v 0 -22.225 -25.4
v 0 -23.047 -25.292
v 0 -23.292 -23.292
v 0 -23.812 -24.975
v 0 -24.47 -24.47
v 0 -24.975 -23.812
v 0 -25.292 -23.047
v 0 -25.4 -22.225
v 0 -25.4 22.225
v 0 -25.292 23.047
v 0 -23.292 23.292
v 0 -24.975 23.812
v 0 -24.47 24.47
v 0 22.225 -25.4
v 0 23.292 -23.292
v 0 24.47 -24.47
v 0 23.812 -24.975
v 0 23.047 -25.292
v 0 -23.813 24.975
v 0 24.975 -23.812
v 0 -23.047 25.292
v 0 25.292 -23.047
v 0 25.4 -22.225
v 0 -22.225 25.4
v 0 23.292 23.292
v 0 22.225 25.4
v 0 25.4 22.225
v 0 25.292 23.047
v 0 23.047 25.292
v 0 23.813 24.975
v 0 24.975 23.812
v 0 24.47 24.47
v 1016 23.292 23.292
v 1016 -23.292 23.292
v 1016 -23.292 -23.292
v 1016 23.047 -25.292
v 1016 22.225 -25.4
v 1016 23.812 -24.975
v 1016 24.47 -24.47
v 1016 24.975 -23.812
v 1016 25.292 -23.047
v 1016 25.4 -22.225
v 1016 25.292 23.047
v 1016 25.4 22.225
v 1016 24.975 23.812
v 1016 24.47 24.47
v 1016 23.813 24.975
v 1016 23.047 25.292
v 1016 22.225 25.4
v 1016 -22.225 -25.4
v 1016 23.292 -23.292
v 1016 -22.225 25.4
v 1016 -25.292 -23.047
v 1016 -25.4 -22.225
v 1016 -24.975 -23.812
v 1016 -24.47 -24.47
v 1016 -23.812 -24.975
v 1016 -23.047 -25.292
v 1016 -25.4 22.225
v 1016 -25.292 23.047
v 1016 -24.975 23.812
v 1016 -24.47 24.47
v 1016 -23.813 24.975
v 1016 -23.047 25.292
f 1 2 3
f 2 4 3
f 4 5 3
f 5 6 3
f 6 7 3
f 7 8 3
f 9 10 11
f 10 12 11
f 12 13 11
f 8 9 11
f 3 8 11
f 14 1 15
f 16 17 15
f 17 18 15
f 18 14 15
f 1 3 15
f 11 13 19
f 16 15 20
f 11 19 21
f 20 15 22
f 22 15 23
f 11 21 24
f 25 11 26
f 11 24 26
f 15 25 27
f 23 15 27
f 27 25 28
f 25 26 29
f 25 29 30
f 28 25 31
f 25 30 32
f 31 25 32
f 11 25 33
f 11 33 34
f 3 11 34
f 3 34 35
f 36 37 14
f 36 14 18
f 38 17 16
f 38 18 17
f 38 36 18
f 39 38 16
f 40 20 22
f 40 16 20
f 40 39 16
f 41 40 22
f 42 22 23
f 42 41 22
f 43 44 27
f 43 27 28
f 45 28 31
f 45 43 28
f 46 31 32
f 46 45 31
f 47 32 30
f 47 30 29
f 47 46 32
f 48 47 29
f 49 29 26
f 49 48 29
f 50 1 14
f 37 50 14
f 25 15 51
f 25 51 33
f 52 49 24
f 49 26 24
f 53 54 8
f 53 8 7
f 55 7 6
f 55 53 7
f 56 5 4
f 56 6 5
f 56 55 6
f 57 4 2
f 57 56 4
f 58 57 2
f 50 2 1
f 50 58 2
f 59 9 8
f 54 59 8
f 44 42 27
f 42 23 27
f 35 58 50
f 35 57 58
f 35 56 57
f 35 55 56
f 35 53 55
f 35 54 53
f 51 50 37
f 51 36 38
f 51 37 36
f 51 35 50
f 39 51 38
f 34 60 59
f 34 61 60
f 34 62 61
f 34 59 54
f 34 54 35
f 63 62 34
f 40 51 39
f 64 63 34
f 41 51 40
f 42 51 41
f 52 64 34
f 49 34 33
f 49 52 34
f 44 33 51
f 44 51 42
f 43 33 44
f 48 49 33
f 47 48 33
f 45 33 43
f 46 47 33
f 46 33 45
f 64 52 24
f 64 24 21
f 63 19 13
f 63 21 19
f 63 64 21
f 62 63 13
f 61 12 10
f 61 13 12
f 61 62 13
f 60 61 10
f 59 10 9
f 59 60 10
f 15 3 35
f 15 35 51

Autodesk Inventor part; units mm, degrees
ref_plane "YZ Plane" through (0, 0, 0) normal (1, 0, 0) x (0, 1, 0)
ref_plane "XZ Plane" through (0, 0, 0) normal (0, 1, 0) x (-1, 0, 0)
ref_plane "XY Plane" through (0, 0, 0) normal (0, 0, 1) x (1, 0, 0)
sketch "Sketch1" plane through (0, 0, 0) normal (1, 0, 0) x (0, 1, 0)
  line L0 (25.4, 25.4) -> (-25.4, 25.4)
  line L1 (-25.4, 25.4) -> (-25.4, -25.4)
  line L2 (-25.4, -25.4) -> (25.4, -25.4)
  line L3 (25.4, -25.4) -> (25.4, 25.4)
  line L4 (23.2918, 23.2918) -> (-23.2918, 23.2918)
  line L5 (-23.2918, 23.2918) -> (-23.2918, -23.2918)
  line L6 (-23.2918, -23.2918) -> (23.2918, -23.2918)
  line L7 (23.2918, -23.2918) -> (23.2918, 23.2918)
  point P0 (0, 0)
  point P1 (0, -25.4)
  point P2 (25.4, 0)
  dimension "d0" = 50.8
  dimension "d1" = 50.8
  dimension "d2" = 2.1082
extrude "Extrusion1" add sketch "Sketch1" along normal blind 1016
fillet "Fillet1" radius 3.175 4 edges at (508, 25.4, 25.4) (508, -25.4, 25.4) (508, 25.4, -25.4) (508, -25.4, -25.4)
properties part number "48_Inch_square" material "Steel"
